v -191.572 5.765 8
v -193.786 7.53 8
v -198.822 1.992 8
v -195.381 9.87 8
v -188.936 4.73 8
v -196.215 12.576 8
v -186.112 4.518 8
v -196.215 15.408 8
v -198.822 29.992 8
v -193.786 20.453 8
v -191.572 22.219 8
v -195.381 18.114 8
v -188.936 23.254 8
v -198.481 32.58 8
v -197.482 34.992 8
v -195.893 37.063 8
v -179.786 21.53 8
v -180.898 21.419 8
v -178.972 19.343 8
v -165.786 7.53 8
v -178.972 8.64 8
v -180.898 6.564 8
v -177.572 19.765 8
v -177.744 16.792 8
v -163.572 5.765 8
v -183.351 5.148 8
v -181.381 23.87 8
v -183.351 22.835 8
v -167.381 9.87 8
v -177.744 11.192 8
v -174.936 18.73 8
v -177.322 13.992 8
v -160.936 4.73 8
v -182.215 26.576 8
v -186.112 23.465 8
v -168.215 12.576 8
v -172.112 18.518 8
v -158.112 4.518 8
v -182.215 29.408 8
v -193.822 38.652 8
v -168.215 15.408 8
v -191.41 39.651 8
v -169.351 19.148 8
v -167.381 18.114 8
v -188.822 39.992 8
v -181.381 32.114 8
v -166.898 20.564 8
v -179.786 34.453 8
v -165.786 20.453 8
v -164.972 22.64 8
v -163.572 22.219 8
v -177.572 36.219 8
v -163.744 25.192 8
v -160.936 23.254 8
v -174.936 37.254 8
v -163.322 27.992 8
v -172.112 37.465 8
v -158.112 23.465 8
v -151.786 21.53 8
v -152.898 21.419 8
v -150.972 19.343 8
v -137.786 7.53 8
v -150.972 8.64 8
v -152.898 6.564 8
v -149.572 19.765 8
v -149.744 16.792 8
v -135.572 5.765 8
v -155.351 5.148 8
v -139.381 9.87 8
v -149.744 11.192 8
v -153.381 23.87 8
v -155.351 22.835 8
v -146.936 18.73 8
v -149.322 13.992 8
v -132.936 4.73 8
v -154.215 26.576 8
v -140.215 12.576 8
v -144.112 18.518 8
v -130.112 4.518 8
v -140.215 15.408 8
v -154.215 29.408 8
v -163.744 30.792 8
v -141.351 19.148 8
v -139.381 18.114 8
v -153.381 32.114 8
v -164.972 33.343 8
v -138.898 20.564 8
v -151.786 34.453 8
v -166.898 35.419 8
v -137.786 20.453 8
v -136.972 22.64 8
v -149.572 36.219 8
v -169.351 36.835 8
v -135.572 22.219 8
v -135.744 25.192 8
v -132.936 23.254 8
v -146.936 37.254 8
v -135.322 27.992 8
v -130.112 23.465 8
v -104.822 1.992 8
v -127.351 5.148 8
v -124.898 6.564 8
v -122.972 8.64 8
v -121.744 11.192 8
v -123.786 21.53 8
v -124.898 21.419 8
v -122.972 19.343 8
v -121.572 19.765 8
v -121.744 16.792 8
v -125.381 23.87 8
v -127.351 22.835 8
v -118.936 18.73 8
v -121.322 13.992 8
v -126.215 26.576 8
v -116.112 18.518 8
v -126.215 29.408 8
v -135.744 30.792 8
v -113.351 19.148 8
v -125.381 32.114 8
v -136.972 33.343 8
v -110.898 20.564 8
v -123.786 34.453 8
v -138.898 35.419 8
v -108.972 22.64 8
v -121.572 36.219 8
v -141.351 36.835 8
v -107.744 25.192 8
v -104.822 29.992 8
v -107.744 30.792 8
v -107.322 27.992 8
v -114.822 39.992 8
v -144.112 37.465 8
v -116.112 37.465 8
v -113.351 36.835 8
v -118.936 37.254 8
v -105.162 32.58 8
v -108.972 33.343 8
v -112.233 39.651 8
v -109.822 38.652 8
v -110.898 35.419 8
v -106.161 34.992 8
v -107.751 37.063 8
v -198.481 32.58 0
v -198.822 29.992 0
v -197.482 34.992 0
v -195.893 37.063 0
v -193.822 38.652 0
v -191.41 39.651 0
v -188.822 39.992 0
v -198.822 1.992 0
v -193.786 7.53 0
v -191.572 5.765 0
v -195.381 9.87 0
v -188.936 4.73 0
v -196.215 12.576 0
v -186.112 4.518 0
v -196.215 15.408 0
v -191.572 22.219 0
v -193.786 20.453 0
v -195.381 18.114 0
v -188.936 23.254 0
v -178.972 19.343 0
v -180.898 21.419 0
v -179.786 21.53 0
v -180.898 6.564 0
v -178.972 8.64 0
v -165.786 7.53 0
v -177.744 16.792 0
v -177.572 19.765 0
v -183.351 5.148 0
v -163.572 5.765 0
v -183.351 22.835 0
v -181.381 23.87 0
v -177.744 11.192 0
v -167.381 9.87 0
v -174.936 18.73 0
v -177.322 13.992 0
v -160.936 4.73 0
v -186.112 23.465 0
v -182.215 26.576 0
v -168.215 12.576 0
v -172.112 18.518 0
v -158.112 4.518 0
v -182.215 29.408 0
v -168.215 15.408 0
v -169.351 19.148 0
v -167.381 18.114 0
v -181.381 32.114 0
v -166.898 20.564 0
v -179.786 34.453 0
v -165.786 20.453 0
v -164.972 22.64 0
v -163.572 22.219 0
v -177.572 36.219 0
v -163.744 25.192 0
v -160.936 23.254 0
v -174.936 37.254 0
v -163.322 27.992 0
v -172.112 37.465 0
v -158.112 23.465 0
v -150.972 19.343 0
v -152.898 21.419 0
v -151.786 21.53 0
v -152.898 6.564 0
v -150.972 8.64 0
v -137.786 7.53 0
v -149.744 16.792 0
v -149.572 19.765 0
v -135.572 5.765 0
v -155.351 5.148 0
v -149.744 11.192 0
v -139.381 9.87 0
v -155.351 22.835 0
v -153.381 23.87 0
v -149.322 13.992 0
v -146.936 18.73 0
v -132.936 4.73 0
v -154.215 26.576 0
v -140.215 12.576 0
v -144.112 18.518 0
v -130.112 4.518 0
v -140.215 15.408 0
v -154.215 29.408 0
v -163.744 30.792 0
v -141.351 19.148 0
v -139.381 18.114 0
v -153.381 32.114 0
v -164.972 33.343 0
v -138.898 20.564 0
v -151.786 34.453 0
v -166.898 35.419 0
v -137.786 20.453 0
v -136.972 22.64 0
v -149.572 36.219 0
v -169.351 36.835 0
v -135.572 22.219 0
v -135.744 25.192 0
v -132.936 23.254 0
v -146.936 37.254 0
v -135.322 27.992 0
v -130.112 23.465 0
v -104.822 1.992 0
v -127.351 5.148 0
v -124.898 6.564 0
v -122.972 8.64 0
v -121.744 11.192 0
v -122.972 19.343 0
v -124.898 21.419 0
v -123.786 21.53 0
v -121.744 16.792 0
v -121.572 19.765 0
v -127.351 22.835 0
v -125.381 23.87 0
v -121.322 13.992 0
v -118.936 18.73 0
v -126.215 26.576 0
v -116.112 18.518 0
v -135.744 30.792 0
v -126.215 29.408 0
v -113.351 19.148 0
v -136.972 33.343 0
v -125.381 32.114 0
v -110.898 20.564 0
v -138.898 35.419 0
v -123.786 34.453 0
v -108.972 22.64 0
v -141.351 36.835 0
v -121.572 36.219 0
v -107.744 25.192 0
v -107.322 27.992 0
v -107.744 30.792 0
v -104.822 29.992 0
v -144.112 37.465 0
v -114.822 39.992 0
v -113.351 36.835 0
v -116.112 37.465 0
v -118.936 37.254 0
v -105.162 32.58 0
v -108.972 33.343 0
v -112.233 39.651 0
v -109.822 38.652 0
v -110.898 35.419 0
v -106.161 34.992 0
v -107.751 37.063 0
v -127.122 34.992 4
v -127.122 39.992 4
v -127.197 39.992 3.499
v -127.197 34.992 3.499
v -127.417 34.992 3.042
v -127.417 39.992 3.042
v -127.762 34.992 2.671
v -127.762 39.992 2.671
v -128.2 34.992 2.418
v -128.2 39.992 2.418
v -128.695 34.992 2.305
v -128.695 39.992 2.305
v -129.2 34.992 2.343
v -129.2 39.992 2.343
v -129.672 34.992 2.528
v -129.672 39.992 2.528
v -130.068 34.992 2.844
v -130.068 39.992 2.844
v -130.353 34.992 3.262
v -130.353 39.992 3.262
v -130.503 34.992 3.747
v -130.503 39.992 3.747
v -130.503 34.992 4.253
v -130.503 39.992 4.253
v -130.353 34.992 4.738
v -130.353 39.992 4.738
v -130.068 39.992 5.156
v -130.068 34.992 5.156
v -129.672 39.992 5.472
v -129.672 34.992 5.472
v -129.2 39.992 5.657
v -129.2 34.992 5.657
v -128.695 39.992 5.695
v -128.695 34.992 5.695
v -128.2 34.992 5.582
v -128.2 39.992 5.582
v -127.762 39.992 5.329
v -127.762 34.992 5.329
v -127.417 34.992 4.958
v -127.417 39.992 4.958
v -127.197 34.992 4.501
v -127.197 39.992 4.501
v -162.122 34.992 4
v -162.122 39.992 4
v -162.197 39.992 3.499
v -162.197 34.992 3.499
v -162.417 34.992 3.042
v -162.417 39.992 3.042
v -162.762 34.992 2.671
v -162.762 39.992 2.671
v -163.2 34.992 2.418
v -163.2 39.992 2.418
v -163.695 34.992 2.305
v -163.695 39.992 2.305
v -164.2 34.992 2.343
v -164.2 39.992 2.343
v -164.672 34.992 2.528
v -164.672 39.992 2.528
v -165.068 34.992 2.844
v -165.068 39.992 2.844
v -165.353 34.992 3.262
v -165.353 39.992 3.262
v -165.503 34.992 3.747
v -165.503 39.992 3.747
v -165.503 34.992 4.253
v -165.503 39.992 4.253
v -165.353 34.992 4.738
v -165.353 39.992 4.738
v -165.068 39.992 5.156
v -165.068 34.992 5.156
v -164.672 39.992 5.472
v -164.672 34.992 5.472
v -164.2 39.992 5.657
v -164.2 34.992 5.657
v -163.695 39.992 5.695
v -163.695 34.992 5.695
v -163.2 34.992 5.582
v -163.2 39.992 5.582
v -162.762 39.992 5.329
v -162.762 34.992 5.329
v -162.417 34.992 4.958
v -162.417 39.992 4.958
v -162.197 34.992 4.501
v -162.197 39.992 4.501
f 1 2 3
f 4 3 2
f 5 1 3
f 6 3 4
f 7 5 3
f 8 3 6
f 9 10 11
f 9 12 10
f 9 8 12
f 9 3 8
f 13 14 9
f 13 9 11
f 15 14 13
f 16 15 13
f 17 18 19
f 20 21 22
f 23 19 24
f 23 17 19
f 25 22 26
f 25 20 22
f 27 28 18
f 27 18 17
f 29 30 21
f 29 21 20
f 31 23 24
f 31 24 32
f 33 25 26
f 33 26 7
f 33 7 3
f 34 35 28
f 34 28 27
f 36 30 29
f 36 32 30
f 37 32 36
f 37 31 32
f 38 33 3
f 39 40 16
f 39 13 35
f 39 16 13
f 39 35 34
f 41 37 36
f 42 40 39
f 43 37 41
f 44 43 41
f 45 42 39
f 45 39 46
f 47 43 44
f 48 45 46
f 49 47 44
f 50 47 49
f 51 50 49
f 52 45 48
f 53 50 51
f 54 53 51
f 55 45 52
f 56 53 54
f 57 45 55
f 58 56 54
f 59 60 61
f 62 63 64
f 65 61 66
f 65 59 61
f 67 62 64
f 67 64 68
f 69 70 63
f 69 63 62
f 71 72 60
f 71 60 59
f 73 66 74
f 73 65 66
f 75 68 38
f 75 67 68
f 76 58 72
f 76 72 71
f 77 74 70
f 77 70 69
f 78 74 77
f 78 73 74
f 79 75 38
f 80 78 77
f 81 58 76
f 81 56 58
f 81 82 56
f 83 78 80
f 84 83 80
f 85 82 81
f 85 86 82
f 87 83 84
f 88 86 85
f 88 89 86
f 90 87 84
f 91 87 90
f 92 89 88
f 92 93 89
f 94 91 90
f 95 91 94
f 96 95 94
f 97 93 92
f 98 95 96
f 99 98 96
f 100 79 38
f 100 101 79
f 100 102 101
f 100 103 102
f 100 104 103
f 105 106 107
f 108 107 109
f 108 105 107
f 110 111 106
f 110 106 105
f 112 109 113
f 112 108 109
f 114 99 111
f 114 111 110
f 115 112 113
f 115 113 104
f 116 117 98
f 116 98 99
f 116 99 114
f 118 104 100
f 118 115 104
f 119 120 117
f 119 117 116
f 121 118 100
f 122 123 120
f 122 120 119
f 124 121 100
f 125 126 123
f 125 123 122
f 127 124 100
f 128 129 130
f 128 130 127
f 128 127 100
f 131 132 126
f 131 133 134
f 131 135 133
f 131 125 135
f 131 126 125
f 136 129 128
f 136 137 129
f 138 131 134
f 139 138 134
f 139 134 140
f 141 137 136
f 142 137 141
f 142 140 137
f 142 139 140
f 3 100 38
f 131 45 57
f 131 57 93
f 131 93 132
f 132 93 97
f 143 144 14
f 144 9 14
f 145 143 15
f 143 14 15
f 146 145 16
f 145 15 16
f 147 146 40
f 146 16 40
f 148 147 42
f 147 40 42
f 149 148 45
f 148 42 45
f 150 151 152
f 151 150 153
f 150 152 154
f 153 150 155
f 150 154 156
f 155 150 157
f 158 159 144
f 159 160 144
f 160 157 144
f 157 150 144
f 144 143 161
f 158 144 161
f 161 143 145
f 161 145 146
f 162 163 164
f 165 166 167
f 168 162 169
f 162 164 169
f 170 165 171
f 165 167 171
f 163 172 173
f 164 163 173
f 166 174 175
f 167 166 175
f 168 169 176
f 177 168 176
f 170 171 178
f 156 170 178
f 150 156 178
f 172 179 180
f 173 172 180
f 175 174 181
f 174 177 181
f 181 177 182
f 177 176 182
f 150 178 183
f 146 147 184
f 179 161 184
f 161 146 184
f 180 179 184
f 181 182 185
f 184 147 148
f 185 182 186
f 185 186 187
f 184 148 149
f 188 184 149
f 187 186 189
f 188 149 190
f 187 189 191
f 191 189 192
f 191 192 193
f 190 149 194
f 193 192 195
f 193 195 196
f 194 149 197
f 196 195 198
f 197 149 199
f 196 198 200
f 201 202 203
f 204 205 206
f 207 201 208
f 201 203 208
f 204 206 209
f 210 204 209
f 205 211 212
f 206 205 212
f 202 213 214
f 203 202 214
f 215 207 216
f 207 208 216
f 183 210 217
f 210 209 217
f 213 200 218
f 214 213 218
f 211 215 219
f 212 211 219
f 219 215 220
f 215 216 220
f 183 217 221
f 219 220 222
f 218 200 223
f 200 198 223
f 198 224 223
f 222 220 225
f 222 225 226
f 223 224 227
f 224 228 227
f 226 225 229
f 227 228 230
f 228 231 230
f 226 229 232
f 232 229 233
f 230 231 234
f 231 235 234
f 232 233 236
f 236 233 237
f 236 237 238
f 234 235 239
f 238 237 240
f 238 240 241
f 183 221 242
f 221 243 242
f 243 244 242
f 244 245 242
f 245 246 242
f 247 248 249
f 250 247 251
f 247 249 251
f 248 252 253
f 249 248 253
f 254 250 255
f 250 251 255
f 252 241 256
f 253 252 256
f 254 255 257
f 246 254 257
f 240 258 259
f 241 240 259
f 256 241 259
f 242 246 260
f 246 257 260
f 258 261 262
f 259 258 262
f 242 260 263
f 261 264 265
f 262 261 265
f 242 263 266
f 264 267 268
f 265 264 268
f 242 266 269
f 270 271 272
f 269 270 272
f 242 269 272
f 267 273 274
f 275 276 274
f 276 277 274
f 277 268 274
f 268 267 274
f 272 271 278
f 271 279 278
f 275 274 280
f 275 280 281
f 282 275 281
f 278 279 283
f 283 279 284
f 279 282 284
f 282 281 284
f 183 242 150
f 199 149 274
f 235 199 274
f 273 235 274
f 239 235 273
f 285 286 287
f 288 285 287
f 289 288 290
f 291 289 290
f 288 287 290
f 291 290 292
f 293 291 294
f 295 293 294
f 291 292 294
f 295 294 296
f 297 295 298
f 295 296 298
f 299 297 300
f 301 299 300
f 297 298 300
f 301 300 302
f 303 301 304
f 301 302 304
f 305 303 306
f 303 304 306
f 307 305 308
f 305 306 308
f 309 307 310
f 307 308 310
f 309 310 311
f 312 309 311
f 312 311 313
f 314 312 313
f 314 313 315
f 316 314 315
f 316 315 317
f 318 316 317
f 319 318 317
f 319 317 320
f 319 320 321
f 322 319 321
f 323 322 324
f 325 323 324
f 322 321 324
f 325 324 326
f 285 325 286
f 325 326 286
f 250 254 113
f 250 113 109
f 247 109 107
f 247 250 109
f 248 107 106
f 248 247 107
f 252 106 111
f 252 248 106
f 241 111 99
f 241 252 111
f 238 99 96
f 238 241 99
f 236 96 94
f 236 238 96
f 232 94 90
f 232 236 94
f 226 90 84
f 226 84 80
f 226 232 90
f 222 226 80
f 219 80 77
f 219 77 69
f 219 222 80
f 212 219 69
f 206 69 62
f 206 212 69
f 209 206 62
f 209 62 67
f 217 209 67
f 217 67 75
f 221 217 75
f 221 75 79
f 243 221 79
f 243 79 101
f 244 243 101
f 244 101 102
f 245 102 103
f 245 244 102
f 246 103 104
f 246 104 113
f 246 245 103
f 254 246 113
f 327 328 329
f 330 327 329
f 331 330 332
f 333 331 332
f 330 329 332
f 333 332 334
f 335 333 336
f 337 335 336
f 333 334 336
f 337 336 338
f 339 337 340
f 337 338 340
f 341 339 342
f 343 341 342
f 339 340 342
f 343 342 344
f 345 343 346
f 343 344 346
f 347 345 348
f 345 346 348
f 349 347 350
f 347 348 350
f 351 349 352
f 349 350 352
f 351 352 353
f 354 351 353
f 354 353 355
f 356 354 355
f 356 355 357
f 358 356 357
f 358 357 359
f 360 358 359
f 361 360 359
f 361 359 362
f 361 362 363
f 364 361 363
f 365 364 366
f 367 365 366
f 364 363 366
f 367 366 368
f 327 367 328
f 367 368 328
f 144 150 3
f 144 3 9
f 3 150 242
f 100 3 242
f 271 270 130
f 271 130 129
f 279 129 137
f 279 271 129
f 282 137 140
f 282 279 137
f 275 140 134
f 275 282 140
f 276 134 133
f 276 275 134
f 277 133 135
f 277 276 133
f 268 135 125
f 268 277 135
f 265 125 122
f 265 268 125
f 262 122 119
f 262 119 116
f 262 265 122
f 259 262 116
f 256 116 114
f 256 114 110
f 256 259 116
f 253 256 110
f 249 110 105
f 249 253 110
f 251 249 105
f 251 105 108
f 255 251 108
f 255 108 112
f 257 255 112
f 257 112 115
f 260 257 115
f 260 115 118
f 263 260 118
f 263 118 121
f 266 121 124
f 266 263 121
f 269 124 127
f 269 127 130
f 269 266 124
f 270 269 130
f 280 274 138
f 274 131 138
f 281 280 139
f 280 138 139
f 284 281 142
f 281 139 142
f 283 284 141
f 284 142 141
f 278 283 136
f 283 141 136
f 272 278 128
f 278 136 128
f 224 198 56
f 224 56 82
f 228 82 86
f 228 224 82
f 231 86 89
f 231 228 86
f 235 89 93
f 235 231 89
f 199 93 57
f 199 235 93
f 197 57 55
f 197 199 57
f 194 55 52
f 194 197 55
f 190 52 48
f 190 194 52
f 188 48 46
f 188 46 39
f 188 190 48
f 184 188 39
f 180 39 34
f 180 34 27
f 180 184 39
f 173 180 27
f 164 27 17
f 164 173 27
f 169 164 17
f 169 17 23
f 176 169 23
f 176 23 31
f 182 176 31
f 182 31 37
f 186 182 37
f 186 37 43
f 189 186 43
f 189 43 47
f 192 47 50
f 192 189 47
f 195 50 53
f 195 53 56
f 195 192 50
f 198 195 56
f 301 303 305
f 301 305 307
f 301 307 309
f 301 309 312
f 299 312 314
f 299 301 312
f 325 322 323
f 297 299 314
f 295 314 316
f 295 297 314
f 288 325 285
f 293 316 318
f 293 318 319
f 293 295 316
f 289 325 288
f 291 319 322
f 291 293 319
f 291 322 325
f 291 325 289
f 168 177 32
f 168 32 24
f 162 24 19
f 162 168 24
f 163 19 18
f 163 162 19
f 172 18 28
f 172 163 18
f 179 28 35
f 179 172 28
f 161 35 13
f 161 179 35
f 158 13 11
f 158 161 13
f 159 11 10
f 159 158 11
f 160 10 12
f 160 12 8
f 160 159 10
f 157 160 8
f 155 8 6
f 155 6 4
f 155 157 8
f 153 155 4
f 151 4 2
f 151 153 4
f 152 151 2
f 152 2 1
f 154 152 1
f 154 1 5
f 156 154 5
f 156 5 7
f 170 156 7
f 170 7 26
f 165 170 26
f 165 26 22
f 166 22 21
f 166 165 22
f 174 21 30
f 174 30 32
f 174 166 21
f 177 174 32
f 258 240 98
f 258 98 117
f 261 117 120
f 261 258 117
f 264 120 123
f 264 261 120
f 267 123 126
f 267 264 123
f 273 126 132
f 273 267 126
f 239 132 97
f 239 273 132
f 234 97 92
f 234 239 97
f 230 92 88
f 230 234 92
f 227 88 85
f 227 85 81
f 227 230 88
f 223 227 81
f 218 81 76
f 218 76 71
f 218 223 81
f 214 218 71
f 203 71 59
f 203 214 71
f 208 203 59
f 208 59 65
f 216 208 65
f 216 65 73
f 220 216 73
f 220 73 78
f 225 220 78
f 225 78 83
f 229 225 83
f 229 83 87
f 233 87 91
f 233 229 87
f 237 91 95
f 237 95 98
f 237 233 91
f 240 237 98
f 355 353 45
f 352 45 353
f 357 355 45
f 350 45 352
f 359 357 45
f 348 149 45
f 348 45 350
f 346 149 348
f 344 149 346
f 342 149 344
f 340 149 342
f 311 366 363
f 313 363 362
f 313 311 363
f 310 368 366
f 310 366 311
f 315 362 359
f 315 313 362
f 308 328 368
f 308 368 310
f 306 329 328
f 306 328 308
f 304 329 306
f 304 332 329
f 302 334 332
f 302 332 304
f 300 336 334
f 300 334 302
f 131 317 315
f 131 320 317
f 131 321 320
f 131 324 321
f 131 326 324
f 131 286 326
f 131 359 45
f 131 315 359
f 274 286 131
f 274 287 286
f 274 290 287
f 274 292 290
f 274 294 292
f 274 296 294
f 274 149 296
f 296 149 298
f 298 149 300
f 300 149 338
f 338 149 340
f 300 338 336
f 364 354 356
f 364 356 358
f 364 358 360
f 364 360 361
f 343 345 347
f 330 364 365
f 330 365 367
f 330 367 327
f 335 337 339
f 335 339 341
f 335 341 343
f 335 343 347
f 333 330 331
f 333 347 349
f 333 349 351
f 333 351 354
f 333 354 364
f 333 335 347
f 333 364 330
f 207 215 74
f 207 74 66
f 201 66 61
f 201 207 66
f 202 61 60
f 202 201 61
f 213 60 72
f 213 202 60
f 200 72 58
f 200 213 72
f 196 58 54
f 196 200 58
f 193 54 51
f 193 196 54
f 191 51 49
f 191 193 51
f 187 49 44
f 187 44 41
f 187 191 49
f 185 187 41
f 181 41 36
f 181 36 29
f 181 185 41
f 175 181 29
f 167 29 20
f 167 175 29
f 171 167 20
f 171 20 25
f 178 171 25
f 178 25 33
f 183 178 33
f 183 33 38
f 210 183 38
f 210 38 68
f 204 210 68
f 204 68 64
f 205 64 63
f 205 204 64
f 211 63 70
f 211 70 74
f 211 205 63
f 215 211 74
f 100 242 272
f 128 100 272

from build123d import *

# Parameters (mm, degrees)
SKETCH2_W           = 94
SKETCH2_H           = 38
SKETCH2_R           = 9.5
BOSS_EXTRUDE1_DEPTH = 8
FILLET1_R           = 10
SKETCH3_R           = 1.7
CUT_EXTRUDE1_DEPTH  = 5


with BuildPart() as part:
    # Sketch2 → Boss-Extrude1 (new body)
    with BuildSketch(Plane.XY):
        with Locations((-151.821569614, 20.991771931)):
            Rectangle(SKETCH2_W, SKETCH2_H)
        with Locations((-186.821569614, 13.991771931)):
            Circle(SKETCH2_R, mode=Mode.SUBTRACT)
        with Locations((-158.821569614, 13.991771931)):
            Circle(SKETCH2_R, mode=Mode.SUBTRACT)
        with Locations((-130.821569614, 13.991771931)):
            Circle(SKETCH2_R, mode=Mode.SUBTRACT)
        with Locations((-144.821569614, 27.991771931)):
            Circle(SKETCH2_R, mode=Mode.SUBTRACT)
        with Locations((-116.821569614, 27.991771931)):
            Circle(SKETCH2_R, mode=Mode.SUBTRACT)
        with Locations((-172.821569614, 27.991771931)):
            Circle(SKETCH2_R, mode=Mode.SUBTRACT)
    extrude(amount=BOSS_EXTRUDE1_DEPTH)

    # Fillet1
    fillet1_edges = [part.edges().sort_by_distance(p)[0] for p in [
        (-198.821569614, 39.991771931, 4),
        (-104.821569614, 39.991771931, 4),
    ]]
    fillet(fillet1_edges, radius=FILLET1_R)

    # Sketch3 → Cut-Extrude1 (cut)
    with BuildSketch(Plane(origin=(0, 39.991771931, 0), x_dir=(1, 0, 0), z_dir=(0, 1, 0))):
        with Locations((-163.821569614, -4)):
            Circle(SKETCH3_R)
        with Locations((-128.821569614, -4)):
            Circle(SKETCH3_R)
    extrude(amount=-CUT_EXTRUDE1_DEPTH, mode=Mode.SUBTRACT)


solid = part.part
